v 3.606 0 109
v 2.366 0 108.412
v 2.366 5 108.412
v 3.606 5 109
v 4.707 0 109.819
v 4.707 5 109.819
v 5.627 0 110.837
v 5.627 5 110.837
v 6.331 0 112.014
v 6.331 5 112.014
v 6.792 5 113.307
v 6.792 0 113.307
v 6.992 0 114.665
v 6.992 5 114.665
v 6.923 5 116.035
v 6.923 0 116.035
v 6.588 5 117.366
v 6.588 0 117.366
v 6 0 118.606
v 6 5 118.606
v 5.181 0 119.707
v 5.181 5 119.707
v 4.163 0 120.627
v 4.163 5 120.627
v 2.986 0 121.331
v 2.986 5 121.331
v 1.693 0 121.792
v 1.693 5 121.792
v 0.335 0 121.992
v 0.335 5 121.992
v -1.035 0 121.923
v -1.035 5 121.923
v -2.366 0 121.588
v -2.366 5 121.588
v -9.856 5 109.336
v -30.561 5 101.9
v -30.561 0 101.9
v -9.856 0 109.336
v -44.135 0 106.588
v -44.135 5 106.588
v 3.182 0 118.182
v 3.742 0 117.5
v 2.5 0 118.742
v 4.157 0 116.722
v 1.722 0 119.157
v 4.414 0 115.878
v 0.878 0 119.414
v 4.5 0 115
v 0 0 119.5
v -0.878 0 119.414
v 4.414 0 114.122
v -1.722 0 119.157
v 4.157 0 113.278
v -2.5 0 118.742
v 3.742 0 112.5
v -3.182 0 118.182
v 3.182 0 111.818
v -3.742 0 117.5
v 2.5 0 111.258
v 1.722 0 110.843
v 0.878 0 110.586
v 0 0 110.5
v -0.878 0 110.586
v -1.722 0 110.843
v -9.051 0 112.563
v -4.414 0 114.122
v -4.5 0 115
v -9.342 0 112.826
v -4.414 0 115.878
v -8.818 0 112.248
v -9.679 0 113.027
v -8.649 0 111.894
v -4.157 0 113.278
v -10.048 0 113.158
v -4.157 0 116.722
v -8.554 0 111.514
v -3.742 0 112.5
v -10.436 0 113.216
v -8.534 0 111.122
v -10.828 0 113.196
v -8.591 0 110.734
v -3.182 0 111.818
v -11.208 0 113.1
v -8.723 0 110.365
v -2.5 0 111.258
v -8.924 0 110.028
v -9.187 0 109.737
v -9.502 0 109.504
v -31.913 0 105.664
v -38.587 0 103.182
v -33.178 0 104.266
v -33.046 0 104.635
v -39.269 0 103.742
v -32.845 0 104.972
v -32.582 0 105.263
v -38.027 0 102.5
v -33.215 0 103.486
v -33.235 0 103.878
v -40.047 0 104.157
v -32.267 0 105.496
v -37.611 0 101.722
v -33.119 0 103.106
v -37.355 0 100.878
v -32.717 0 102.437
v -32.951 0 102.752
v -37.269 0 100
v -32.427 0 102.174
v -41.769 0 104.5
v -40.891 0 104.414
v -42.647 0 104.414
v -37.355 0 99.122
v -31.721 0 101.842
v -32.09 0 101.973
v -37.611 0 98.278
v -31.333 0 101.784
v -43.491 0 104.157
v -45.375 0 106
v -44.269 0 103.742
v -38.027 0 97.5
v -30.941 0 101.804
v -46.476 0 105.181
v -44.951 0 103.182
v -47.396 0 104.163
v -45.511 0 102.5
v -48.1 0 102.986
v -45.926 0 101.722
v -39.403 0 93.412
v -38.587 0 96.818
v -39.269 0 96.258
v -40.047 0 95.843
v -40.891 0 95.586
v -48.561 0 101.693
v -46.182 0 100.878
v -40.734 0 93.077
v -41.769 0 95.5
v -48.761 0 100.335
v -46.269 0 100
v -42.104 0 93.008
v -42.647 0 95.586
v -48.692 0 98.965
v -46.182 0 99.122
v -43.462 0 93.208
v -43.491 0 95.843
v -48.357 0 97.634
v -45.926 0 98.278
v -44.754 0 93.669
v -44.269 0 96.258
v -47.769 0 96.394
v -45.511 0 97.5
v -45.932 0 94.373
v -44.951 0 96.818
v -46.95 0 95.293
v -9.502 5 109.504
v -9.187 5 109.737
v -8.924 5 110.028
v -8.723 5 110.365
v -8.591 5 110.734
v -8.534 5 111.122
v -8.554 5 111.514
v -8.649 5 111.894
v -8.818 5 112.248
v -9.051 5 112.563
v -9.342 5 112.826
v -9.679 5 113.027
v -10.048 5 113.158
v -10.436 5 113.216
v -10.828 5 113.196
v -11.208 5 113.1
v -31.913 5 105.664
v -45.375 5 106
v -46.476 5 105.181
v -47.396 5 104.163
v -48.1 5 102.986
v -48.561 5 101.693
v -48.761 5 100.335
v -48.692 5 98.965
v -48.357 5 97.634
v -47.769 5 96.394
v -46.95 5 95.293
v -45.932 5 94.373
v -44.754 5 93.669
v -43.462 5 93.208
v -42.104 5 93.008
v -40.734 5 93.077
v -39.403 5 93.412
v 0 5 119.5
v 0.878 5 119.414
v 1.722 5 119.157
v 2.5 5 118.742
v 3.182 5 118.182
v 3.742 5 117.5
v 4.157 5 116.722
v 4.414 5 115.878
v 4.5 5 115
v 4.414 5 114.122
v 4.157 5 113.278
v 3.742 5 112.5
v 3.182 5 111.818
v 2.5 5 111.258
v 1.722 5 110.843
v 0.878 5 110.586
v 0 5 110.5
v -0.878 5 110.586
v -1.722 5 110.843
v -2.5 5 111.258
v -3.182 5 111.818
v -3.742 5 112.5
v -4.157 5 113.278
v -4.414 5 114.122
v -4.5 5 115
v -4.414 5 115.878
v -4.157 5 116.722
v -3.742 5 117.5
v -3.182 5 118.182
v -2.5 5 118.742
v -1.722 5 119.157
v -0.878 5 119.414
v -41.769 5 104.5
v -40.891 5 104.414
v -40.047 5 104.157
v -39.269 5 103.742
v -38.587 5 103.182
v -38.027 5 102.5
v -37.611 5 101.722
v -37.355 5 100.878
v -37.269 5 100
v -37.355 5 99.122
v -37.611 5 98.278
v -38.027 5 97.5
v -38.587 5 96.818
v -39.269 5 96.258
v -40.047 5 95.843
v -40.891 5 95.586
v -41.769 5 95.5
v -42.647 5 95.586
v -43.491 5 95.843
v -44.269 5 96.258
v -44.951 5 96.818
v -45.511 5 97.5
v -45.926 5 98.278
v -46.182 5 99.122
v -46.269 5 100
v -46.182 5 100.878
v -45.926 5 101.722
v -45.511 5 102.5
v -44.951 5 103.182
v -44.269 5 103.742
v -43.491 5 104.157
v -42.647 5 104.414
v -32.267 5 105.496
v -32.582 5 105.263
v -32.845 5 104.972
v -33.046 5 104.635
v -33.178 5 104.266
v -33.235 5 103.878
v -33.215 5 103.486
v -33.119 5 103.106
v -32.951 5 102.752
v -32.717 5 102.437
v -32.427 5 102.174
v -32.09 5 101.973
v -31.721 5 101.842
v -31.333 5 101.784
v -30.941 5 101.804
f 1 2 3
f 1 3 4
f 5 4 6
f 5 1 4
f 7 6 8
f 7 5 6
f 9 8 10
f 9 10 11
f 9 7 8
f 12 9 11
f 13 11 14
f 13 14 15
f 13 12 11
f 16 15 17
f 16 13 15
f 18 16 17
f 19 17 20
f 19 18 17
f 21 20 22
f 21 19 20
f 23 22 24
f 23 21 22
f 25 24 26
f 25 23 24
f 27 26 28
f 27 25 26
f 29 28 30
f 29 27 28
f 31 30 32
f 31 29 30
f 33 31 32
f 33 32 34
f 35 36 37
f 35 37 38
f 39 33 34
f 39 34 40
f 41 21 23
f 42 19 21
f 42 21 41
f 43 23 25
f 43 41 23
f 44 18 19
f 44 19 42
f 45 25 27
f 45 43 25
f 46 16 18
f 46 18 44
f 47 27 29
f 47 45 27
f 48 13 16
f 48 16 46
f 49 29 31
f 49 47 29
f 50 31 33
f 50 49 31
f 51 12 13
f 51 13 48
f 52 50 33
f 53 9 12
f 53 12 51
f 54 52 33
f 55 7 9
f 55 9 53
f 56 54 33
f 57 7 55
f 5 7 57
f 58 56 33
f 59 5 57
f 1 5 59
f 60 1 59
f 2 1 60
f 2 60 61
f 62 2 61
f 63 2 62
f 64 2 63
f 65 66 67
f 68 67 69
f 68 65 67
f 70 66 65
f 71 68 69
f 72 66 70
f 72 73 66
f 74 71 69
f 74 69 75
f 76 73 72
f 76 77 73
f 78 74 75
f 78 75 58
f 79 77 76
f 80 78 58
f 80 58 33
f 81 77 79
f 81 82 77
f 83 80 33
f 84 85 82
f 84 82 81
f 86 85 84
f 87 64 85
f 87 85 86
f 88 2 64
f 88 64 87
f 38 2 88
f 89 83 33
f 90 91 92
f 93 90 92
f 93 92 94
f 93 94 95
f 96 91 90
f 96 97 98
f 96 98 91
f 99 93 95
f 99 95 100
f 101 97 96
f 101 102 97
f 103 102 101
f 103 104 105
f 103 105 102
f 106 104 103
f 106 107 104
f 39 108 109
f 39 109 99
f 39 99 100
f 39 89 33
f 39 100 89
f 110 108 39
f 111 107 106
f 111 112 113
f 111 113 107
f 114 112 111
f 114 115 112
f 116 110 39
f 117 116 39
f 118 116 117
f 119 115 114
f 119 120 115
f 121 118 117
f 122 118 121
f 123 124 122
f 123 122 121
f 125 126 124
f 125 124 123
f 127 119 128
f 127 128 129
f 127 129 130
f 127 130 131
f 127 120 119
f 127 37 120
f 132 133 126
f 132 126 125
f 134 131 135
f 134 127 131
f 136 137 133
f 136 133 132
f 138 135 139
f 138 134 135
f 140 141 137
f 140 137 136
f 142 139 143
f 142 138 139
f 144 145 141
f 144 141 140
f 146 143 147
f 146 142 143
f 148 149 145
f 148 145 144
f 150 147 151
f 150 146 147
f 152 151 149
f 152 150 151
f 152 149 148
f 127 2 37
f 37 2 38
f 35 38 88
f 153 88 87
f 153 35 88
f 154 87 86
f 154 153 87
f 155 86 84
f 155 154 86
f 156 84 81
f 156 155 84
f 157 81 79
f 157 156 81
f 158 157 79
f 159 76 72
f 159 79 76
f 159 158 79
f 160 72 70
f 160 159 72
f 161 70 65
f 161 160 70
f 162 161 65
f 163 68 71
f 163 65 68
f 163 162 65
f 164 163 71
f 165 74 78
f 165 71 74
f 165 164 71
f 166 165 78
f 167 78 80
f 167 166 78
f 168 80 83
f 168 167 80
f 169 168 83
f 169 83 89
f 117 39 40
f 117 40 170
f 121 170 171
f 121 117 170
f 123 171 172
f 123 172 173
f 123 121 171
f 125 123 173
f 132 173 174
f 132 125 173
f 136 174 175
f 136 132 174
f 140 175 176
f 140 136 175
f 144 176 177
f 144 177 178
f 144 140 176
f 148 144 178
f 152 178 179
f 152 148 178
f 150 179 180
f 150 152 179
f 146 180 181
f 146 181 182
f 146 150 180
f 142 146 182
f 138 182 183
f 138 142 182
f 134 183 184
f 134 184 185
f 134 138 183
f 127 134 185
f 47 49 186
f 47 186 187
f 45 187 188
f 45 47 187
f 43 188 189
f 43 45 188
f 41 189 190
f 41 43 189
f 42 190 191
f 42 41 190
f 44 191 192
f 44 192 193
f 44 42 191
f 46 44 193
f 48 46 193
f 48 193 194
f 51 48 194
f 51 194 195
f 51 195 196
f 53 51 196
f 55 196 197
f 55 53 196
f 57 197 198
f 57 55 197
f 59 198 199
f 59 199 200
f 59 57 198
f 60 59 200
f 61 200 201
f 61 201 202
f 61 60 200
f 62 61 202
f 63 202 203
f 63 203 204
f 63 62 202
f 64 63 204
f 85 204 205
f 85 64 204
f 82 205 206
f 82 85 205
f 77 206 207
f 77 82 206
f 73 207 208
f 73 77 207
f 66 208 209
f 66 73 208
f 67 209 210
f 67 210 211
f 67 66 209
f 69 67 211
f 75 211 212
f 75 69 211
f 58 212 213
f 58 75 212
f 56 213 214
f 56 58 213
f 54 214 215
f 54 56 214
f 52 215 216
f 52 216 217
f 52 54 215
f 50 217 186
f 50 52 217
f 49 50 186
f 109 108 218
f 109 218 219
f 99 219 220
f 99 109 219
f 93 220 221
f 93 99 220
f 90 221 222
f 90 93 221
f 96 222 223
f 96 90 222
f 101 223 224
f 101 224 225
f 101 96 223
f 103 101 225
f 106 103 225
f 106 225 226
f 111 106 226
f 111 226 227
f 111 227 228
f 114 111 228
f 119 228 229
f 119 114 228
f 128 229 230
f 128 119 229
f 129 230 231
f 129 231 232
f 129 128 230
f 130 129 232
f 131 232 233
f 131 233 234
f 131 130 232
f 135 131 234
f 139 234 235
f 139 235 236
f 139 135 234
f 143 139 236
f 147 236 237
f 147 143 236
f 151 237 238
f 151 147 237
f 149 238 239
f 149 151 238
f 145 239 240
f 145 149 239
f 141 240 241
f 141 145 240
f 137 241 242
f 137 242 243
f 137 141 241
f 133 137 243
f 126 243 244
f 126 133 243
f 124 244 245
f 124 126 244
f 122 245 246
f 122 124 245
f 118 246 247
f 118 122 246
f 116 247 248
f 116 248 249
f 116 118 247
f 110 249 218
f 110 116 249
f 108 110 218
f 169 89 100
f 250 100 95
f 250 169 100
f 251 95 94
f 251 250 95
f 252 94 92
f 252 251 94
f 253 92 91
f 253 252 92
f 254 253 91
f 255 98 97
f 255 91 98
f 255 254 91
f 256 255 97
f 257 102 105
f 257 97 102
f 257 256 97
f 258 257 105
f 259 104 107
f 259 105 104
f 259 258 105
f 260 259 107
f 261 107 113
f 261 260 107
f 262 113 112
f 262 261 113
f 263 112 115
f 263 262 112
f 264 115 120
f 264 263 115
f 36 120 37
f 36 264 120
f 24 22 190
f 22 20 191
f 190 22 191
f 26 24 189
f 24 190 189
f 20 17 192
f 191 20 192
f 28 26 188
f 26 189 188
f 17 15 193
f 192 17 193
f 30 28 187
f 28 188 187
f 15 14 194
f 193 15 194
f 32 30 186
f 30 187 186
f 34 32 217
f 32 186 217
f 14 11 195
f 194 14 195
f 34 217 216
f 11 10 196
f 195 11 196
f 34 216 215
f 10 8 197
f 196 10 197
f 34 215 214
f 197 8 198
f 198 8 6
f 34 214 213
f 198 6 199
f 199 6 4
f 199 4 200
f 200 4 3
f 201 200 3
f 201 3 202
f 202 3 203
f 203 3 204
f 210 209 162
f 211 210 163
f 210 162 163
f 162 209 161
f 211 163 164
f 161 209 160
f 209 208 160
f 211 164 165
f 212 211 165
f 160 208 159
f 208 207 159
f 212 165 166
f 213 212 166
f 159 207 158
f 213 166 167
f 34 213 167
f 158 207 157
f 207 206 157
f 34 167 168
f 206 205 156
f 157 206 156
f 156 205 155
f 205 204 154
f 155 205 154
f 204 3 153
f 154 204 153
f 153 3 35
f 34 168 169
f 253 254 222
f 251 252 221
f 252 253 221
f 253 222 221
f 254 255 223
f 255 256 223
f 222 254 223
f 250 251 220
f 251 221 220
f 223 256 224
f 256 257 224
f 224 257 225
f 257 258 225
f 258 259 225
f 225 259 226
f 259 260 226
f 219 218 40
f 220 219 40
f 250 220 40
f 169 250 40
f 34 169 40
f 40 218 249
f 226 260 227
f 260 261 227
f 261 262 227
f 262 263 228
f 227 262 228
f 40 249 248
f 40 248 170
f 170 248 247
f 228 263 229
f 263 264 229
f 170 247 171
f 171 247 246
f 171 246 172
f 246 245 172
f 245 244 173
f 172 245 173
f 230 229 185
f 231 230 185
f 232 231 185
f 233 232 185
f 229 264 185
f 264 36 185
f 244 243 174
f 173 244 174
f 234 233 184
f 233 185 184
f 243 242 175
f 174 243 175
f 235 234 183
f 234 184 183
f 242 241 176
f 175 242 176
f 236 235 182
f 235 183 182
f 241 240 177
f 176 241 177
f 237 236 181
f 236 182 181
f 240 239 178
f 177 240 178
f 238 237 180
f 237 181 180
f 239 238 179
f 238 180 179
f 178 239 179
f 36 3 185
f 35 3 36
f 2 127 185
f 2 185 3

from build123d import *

# Parameters (mm, degrees)
SKETCH_1_R          = 4.5
EXTRUDE_1_DEPTH     = 5
CUT_EXTRUDE_1_DEPTH = 10


with BuildPart() as part:
    # 草图1 → 凸台-拉伸1 (new body)
    with BuildSketch(Plane(origin=(0, 0, 0), x_dir=(1, 0, 0), z_dir=(0, 1, 0))):
        with BuildLine():
            Line((-39.403034963, -93.411939556), (2.365895093, -108.411939556))
            ThreePointArc((2.365895093, -108.411939556), (6.588060444, -117.365895093), (-2.365895093, -121.588060444))
            Line((-2.365895093, -121.588060444), (-44.134825149, -106.588060444))
            ThreePointArc((-44.134825149, -106.588060444), (-48.356990499, -97.634104907), (-39.403034963, -93.411939556))
        make_face()
        with Locations(Location((-41.768930056, -100, 0), (0, 0, 270))):
            Circle(SKETCH_1_R, mode=Mode.SUBTRACT)
        with Locations(Location((0, -115, 0), (0, 0, 270))):
            Circle(SKETCH_1_R, mode=Mode.SUBTRACT)
    extrude(amount=EXTRUDE_1_DEPTH)

    # 草图2 → 切除-拉伸1 (cut)
    with BuildSketch(Plane(origin=(0, 5, 0), x_dir=(1, 0, 0), z_dir=(0, 1, 0))):
        with BuildLine():
            Line((-30.561161413, -101.89986187), (-9.85582859, -109.335532162))
            ThreePointArc((-9.85582859, -109.335532162), (-8.649495632, -111.893805173), (-11.207768643, -113.10013813))
            Line((-11.207768643, -113.10013813), (-31.913101466, -105.664467838))
            ThreePointArc((-31.913101466, -105.664467838), (-33.119434423, -103.106194827), (-30.561161413, -101.89986187))
        make_face()
    extrude(amount=-CUT_EXTRUDE_1_DEPTH, mode=Mode.SUBTRACT)


solid = part.part
